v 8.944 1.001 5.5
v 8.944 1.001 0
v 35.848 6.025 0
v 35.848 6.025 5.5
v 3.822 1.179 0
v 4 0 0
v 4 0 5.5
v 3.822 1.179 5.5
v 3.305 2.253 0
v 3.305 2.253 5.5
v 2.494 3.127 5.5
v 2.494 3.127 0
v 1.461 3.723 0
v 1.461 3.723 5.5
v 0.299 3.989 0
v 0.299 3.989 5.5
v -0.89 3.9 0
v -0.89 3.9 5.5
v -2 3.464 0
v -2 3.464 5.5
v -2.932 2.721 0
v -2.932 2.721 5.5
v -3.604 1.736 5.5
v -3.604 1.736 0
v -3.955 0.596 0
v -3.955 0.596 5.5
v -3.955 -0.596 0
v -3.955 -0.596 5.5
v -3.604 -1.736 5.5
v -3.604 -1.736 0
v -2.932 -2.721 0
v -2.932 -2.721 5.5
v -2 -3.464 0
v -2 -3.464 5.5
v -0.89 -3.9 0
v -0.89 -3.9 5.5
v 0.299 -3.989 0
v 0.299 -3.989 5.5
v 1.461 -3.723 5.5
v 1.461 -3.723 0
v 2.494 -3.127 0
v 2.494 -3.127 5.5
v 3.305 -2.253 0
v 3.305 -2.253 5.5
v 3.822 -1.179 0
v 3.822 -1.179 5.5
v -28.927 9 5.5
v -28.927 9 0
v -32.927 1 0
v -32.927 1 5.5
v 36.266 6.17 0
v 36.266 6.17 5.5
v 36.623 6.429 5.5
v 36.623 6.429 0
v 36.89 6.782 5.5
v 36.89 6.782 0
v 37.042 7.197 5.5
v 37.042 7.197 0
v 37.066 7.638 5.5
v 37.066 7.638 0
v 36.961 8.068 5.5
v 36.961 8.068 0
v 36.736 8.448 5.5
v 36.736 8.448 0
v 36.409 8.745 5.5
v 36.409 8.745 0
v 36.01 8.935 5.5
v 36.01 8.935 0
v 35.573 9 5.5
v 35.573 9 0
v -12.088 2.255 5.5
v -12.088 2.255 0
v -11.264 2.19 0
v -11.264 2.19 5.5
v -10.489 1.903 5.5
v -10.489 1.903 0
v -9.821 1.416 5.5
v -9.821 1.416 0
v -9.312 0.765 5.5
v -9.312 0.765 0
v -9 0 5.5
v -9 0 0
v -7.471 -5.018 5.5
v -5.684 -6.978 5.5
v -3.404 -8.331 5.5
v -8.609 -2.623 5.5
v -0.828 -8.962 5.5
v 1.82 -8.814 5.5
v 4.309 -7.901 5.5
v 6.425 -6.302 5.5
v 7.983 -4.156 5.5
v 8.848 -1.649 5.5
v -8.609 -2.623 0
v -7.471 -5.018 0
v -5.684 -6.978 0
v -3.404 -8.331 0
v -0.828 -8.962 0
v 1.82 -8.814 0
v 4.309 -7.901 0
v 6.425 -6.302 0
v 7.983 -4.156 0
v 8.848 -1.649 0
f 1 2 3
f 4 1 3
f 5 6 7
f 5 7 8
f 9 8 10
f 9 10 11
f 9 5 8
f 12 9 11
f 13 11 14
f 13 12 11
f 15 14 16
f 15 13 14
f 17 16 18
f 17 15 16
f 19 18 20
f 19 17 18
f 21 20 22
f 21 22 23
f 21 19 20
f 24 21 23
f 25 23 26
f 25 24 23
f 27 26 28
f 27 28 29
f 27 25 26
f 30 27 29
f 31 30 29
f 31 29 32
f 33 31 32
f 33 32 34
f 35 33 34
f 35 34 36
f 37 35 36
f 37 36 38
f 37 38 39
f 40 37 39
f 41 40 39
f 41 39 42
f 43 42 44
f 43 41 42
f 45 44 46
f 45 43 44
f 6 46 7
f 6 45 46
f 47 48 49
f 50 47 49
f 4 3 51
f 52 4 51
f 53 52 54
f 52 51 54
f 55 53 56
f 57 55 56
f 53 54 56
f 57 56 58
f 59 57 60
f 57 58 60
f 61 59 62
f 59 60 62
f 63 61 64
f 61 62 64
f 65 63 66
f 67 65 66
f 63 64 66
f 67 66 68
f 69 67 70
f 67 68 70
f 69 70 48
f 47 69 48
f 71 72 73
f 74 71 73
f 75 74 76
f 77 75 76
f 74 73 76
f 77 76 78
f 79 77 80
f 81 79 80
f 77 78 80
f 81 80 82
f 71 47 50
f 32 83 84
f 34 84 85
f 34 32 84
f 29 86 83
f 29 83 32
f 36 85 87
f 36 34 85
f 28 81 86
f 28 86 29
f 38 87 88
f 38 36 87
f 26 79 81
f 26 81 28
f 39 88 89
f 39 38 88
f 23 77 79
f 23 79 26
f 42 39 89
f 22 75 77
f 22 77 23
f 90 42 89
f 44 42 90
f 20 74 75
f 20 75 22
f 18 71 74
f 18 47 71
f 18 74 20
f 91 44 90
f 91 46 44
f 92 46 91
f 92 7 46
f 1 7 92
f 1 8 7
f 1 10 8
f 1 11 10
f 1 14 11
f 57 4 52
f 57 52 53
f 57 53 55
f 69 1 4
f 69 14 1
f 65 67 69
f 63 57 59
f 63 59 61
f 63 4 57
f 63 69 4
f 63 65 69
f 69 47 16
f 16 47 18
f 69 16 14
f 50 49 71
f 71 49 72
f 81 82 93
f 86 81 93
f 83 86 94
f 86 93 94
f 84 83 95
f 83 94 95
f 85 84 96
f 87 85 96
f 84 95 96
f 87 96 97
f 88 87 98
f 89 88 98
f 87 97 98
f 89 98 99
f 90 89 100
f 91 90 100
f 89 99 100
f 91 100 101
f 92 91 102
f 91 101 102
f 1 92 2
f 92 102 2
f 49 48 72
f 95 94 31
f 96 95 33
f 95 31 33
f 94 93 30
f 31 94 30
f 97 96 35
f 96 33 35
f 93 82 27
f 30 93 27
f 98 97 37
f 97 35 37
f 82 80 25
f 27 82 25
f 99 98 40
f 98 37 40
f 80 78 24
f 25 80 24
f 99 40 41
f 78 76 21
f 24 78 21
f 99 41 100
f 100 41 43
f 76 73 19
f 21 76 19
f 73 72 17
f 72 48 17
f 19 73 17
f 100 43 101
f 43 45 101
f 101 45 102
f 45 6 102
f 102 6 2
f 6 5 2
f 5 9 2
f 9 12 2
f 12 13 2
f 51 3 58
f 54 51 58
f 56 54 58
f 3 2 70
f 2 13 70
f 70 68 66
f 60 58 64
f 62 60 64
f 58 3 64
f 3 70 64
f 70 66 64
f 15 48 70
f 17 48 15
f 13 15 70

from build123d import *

# Parameters (mm, degrees)
SKETCH3_R           = 4
BOSS_EXTRUDE1_DEPTH = 5.5


with BuildPart() as part:
    # Sketch3 → Boss-Extrude1 (new body)
    with BuildSketch(Plane.XY):
        with BuildLine():
            Line((35.572698846, 9), (-28.927301154, 9))
            Line((-28.927301154, 9), (-32.927301154, 1))
            Line((-32.927301154, 1), (-12.087578676, 2.254578437))
            ThreePointArc((-12.087578676, 2.254578437), (-10.138135968, 1.682819545), (-9, 0))
            ThreePointArc((-9, 0), (0.50116839, -8.986035291), (8.944184499, 1.000781519))
            Line((8.944184499, 1.000781519), (35.848085015, 6.02549586))
            ThreePointArc((35.848085015, 6.02549586), (37.066311281, 7.638281941), (35.572698846, 9))
        make_face()
        Circle(SKETCH3_R, mode=Mode.SUBTRACT)
    extrude(amount=BOSS_EXTRUDE1_DEPTH)


solid = part.part
